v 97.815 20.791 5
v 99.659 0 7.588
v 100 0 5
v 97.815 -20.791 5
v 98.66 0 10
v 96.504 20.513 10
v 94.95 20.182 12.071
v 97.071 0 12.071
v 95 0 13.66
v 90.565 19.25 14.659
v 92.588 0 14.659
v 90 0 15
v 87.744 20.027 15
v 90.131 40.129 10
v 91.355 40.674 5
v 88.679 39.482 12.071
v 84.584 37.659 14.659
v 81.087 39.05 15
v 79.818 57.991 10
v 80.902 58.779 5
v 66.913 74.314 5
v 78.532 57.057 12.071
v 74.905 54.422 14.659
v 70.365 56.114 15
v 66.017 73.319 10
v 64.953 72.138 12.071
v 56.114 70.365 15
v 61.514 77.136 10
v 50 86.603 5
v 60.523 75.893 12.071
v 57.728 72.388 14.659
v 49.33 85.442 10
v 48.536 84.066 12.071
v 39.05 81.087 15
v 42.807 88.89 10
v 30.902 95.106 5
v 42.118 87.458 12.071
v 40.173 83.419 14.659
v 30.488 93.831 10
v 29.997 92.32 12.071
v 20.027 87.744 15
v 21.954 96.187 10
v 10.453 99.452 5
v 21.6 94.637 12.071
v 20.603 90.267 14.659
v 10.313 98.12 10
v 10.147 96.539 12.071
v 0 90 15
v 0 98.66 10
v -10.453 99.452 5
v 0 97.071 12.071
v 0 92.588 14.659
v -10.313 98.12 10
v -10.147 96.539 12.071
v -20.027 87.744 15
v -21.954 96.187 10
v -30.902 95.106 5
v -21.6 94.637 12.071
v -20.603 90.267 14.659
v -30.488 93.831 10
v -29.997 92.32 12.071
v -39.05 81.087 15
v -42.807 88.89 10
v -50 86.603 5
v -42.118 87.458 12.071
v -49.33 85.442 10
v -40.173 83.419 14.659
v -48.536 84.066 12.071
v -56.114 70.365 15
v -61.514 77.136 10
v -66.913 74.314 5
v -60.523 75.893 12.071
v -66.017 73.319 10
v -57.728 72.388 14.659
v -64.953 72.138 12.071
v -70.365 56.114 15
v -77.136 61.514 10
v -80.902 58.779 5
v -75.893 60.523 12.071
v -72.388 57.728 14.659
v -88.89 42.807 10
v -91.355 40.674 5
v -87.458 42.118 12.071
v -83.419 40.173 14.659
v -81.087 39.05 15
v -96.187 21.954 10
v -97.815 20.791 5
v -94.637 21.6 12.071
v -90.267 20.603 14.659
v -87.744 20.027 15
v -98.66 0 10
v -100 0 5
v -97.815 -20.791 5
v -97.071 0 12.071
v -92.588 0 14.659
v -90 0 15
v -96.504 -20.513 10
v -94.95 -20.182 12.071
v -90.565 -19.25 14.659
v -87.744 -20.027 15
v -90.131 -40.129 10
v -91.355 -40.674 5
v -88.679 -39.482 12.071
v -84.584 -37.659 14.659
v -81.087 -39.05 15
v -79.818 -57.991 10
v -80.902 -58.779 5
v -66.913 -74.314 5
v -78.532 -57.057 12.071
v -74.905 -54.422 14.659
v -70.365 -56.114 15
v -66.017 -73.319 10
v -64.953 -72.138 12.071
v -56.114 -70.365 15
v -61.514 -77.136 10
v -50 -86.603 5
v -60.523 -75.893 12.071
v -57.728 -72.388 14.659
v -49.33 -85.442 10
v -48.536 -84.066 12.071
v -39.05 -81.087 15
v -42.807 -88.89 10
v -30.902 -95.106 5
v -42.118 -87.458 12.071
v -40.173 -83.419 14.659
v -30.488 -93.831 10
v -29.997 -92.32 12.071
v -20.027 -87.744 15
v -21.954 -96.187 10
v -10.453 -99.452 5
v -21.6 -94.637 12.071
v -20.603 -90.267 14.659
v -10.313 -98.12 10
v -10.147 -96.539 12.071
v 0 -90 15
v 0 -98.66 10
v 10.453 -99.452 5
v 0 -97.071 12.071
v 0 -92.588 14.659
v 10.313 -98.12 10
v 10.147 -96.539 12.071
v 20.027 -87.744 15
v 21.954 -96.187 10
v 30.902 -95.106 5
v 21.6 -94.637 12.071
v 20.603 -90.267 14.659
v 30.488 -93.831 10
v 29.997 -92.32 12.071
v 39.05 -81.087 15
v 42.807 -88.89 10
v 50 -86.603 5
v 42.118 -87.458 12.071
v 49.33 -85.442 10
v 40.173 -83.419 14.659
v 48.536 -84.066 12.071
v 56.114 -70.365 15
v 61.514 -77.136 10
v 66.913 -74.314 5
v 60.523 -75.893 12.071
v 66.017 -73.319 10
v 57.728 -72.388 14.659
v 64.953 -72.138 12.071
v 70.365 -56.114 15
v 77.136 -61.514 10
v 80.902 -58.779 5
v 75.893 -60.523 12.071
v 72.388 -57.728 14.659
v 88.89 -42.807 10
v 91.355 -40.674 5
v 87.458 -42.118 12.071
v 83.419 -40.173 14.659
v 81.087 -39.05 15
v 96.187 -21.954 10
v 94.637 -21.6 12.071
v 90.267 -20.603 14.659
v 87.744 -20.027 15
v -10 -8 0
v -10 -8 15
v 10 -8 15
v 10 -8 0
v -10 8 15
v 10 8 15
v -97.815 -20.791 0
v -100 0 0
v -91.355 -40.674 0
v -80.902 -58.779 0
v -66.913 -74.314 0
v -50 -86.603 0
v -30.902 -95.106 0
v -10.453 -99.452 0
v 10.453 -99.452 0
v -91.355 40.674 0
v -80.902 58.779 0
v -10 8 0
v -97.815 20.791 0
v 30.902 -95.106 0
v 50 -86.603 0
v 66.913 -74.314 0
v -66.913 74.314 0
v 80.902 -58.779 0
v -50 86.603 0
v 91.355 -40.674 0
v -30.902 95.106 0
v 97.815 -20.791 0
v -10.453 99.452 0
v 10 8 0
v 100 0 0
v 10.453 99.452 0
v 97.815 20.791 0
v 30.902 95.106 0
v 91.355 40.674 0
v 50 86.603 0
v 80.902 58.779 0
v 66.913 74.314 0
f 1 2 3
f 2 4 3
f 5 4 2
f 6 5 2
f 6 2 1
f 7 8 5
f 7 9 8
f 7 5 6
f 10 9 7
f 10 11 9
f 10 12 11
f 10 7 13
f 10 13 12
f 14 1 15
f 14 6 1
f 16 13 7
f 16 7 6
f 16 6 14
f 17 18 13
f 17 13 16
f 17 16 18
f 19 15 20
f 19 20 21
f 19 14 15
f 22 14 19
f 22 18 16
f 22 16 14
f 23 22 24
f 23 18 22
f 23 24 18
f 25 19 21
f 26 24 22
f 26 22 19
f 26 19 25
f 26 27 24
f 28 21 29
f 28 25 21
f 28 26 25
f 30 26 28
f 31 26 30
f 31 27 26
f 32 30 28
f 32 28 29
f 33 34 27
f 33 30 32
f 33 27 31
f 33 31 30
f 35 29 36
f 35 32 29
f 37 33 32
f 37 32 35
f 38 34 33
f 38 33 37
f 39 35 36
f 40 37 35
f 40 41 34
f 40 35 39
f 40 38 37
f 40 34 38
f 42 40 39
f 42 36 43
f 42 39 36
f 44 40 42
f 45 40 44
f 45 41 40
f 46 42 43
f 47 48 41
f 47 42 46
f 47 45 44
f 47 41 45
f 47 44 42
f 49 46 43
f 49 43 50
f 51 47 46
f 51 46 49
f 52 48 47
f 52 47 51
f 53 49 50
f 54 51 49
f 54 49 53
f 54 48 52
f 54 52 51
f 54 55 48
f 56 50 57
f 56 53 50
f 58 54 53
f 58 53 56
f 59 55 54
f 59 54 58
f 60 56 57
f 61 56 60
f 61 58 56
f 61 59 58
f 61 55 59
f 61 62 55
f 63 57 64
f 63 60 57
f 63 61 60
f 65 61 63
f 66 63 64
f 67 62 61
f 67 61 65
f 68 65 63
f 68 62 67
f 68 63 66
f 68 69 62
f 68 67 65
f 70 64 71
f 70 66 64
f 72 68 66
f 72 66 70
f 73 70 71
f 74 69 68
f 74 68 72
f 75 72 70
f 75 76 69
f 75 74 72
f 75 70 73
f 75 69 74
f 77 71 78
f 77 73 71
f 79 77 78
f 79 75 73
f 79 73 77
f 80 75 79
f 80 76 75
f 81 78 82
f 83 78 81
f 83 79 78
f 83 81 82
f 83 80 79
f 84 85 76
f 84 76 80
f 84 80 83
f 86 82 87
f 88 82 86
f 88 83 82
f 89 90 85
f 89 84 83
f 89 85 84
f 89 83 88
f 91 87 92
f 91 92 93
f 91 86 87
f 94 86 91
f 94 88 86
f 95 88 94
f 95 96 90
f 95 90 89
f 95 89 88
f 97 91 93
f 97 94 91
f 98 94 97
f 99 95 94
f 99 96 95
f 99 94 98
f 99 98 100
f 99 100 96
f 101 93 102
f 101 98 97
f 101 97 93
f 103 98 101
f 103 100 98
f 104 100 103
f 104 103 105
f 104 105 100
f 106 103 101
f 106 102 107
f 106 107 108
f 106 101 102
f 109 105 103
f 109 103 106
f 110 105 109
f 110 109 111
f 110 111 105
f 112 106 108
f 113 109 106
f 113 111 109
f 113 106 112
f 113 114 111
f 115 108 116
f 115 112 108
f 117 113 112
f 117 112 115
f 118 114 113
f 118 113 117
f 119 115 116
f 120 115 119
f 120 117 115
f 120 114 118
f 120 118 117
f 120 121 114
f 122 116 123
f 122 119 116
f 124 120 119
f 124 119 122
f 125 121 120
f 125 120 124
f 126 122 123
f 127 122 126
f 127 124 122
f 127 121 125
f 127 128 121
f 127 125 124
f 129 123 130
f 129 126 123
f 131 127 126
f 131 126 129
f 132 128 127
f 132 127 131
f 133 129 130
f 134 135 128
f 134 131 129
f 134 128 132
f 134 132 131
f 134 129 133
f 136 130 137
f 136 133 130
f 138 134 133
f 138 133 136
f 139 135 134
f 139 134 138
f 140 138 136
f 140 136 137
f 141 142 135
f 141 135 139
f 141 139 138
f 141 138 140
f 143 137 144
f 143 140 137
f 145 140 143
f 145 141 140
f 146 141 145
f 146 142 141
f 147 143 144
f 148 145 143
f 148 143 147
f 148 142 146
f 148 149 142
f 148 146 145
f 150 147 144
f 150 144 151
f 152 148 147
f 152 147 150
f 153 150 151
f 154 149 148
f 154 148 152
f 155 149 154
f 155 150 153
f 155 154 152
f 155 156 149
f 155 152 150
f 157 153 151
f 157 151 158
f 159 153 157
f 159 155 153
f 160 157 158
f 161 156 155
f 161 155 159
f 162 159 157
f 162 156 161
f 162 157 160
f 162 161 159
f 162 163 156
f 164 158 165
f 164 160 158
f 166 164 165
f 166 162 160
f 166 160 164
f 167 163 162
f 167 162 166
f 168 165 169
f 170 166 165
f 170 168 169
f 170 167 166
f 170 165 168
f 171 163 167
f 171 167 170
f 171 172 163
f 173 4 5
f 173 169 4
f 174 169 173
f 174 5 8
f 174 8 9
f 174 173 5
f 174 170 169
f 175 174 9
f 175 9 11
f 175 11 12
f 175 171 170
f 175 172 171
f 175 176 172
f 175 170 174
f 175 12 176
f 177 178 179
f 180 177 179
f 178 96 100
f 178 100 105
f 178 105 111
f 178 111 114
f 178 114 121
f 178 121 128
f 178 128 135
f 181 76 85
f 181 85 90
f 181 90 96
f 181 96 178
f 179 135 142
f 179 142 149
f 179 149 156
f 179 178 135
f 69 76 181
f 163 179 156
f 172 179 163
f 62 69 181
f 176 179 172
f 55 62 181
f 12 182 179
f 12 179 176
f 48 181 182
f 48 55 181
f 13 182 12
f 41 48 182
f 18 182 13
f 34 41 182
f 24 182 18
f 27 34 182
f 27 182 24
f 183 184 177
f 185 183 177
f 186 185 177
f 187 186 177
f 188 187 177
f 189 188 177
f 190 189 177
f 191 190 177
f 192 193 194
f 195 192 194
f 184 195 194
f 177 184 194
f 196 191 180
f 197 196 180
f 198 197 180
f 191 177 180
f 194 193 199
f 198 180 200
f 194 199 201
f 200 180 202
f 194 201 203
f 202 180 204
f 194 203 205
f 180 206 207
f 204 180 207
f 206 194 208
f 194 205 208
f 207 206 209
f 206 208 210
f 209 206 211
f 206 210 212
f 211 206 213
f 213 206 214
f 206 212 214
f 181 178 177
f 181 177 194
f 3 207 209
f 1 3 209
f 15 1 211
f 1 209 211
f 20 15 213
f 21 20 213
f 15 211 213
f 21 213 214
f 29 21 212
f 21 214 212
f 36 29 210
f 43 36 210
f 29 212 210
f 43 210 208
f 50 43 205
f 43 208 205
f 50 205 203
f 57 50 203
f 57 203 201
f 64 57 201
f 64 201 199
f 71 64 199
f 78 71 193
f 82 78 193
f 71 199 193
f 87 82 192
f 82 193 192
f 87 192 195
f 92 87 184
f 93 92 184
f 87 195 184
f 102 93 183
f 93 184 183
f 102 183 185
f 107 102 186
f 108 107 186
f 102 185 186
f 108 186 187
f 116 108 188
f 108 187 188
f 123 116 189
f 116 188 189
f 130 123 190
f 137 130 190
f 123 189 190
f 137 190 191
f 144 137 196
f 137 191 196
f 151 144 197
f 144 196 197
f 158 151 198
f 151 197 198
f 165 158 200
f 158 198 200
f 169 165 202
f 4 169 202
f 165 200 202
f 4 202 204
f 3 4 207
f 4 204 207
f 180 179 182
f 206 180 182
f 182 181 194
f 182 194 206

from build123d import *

# Parameters (mm, degrees)
F0_R     = 100
F1_DEPTH = 15
F2_R     = 10
F3_W     = 20
F3_H     = 16
F4_DEPTH = 50


with BuildPart() as f1:
    # F0 (on Top) → F1 (new body)
    with BuildSketch(Plane.XY):
        Circle(F0_R)
    extrude(amount=F1_DEPTH)

    # F2
    f2_edges = [f1.edges().sort_by_distance(p)[0] for p in [
        (-100, 0, 15),
    ]]
    fillet(f2_edges, radius=F2_R)

    # F3 (on face) → F4 (cut)
    with BuildSketch(Plane.XY.offset(15)):
        Rectangle(F3_W, F3_H)
    extrude(amount=-F4_DEPTH, mode=Mode.SUBTRACT)


solid = f1.part
